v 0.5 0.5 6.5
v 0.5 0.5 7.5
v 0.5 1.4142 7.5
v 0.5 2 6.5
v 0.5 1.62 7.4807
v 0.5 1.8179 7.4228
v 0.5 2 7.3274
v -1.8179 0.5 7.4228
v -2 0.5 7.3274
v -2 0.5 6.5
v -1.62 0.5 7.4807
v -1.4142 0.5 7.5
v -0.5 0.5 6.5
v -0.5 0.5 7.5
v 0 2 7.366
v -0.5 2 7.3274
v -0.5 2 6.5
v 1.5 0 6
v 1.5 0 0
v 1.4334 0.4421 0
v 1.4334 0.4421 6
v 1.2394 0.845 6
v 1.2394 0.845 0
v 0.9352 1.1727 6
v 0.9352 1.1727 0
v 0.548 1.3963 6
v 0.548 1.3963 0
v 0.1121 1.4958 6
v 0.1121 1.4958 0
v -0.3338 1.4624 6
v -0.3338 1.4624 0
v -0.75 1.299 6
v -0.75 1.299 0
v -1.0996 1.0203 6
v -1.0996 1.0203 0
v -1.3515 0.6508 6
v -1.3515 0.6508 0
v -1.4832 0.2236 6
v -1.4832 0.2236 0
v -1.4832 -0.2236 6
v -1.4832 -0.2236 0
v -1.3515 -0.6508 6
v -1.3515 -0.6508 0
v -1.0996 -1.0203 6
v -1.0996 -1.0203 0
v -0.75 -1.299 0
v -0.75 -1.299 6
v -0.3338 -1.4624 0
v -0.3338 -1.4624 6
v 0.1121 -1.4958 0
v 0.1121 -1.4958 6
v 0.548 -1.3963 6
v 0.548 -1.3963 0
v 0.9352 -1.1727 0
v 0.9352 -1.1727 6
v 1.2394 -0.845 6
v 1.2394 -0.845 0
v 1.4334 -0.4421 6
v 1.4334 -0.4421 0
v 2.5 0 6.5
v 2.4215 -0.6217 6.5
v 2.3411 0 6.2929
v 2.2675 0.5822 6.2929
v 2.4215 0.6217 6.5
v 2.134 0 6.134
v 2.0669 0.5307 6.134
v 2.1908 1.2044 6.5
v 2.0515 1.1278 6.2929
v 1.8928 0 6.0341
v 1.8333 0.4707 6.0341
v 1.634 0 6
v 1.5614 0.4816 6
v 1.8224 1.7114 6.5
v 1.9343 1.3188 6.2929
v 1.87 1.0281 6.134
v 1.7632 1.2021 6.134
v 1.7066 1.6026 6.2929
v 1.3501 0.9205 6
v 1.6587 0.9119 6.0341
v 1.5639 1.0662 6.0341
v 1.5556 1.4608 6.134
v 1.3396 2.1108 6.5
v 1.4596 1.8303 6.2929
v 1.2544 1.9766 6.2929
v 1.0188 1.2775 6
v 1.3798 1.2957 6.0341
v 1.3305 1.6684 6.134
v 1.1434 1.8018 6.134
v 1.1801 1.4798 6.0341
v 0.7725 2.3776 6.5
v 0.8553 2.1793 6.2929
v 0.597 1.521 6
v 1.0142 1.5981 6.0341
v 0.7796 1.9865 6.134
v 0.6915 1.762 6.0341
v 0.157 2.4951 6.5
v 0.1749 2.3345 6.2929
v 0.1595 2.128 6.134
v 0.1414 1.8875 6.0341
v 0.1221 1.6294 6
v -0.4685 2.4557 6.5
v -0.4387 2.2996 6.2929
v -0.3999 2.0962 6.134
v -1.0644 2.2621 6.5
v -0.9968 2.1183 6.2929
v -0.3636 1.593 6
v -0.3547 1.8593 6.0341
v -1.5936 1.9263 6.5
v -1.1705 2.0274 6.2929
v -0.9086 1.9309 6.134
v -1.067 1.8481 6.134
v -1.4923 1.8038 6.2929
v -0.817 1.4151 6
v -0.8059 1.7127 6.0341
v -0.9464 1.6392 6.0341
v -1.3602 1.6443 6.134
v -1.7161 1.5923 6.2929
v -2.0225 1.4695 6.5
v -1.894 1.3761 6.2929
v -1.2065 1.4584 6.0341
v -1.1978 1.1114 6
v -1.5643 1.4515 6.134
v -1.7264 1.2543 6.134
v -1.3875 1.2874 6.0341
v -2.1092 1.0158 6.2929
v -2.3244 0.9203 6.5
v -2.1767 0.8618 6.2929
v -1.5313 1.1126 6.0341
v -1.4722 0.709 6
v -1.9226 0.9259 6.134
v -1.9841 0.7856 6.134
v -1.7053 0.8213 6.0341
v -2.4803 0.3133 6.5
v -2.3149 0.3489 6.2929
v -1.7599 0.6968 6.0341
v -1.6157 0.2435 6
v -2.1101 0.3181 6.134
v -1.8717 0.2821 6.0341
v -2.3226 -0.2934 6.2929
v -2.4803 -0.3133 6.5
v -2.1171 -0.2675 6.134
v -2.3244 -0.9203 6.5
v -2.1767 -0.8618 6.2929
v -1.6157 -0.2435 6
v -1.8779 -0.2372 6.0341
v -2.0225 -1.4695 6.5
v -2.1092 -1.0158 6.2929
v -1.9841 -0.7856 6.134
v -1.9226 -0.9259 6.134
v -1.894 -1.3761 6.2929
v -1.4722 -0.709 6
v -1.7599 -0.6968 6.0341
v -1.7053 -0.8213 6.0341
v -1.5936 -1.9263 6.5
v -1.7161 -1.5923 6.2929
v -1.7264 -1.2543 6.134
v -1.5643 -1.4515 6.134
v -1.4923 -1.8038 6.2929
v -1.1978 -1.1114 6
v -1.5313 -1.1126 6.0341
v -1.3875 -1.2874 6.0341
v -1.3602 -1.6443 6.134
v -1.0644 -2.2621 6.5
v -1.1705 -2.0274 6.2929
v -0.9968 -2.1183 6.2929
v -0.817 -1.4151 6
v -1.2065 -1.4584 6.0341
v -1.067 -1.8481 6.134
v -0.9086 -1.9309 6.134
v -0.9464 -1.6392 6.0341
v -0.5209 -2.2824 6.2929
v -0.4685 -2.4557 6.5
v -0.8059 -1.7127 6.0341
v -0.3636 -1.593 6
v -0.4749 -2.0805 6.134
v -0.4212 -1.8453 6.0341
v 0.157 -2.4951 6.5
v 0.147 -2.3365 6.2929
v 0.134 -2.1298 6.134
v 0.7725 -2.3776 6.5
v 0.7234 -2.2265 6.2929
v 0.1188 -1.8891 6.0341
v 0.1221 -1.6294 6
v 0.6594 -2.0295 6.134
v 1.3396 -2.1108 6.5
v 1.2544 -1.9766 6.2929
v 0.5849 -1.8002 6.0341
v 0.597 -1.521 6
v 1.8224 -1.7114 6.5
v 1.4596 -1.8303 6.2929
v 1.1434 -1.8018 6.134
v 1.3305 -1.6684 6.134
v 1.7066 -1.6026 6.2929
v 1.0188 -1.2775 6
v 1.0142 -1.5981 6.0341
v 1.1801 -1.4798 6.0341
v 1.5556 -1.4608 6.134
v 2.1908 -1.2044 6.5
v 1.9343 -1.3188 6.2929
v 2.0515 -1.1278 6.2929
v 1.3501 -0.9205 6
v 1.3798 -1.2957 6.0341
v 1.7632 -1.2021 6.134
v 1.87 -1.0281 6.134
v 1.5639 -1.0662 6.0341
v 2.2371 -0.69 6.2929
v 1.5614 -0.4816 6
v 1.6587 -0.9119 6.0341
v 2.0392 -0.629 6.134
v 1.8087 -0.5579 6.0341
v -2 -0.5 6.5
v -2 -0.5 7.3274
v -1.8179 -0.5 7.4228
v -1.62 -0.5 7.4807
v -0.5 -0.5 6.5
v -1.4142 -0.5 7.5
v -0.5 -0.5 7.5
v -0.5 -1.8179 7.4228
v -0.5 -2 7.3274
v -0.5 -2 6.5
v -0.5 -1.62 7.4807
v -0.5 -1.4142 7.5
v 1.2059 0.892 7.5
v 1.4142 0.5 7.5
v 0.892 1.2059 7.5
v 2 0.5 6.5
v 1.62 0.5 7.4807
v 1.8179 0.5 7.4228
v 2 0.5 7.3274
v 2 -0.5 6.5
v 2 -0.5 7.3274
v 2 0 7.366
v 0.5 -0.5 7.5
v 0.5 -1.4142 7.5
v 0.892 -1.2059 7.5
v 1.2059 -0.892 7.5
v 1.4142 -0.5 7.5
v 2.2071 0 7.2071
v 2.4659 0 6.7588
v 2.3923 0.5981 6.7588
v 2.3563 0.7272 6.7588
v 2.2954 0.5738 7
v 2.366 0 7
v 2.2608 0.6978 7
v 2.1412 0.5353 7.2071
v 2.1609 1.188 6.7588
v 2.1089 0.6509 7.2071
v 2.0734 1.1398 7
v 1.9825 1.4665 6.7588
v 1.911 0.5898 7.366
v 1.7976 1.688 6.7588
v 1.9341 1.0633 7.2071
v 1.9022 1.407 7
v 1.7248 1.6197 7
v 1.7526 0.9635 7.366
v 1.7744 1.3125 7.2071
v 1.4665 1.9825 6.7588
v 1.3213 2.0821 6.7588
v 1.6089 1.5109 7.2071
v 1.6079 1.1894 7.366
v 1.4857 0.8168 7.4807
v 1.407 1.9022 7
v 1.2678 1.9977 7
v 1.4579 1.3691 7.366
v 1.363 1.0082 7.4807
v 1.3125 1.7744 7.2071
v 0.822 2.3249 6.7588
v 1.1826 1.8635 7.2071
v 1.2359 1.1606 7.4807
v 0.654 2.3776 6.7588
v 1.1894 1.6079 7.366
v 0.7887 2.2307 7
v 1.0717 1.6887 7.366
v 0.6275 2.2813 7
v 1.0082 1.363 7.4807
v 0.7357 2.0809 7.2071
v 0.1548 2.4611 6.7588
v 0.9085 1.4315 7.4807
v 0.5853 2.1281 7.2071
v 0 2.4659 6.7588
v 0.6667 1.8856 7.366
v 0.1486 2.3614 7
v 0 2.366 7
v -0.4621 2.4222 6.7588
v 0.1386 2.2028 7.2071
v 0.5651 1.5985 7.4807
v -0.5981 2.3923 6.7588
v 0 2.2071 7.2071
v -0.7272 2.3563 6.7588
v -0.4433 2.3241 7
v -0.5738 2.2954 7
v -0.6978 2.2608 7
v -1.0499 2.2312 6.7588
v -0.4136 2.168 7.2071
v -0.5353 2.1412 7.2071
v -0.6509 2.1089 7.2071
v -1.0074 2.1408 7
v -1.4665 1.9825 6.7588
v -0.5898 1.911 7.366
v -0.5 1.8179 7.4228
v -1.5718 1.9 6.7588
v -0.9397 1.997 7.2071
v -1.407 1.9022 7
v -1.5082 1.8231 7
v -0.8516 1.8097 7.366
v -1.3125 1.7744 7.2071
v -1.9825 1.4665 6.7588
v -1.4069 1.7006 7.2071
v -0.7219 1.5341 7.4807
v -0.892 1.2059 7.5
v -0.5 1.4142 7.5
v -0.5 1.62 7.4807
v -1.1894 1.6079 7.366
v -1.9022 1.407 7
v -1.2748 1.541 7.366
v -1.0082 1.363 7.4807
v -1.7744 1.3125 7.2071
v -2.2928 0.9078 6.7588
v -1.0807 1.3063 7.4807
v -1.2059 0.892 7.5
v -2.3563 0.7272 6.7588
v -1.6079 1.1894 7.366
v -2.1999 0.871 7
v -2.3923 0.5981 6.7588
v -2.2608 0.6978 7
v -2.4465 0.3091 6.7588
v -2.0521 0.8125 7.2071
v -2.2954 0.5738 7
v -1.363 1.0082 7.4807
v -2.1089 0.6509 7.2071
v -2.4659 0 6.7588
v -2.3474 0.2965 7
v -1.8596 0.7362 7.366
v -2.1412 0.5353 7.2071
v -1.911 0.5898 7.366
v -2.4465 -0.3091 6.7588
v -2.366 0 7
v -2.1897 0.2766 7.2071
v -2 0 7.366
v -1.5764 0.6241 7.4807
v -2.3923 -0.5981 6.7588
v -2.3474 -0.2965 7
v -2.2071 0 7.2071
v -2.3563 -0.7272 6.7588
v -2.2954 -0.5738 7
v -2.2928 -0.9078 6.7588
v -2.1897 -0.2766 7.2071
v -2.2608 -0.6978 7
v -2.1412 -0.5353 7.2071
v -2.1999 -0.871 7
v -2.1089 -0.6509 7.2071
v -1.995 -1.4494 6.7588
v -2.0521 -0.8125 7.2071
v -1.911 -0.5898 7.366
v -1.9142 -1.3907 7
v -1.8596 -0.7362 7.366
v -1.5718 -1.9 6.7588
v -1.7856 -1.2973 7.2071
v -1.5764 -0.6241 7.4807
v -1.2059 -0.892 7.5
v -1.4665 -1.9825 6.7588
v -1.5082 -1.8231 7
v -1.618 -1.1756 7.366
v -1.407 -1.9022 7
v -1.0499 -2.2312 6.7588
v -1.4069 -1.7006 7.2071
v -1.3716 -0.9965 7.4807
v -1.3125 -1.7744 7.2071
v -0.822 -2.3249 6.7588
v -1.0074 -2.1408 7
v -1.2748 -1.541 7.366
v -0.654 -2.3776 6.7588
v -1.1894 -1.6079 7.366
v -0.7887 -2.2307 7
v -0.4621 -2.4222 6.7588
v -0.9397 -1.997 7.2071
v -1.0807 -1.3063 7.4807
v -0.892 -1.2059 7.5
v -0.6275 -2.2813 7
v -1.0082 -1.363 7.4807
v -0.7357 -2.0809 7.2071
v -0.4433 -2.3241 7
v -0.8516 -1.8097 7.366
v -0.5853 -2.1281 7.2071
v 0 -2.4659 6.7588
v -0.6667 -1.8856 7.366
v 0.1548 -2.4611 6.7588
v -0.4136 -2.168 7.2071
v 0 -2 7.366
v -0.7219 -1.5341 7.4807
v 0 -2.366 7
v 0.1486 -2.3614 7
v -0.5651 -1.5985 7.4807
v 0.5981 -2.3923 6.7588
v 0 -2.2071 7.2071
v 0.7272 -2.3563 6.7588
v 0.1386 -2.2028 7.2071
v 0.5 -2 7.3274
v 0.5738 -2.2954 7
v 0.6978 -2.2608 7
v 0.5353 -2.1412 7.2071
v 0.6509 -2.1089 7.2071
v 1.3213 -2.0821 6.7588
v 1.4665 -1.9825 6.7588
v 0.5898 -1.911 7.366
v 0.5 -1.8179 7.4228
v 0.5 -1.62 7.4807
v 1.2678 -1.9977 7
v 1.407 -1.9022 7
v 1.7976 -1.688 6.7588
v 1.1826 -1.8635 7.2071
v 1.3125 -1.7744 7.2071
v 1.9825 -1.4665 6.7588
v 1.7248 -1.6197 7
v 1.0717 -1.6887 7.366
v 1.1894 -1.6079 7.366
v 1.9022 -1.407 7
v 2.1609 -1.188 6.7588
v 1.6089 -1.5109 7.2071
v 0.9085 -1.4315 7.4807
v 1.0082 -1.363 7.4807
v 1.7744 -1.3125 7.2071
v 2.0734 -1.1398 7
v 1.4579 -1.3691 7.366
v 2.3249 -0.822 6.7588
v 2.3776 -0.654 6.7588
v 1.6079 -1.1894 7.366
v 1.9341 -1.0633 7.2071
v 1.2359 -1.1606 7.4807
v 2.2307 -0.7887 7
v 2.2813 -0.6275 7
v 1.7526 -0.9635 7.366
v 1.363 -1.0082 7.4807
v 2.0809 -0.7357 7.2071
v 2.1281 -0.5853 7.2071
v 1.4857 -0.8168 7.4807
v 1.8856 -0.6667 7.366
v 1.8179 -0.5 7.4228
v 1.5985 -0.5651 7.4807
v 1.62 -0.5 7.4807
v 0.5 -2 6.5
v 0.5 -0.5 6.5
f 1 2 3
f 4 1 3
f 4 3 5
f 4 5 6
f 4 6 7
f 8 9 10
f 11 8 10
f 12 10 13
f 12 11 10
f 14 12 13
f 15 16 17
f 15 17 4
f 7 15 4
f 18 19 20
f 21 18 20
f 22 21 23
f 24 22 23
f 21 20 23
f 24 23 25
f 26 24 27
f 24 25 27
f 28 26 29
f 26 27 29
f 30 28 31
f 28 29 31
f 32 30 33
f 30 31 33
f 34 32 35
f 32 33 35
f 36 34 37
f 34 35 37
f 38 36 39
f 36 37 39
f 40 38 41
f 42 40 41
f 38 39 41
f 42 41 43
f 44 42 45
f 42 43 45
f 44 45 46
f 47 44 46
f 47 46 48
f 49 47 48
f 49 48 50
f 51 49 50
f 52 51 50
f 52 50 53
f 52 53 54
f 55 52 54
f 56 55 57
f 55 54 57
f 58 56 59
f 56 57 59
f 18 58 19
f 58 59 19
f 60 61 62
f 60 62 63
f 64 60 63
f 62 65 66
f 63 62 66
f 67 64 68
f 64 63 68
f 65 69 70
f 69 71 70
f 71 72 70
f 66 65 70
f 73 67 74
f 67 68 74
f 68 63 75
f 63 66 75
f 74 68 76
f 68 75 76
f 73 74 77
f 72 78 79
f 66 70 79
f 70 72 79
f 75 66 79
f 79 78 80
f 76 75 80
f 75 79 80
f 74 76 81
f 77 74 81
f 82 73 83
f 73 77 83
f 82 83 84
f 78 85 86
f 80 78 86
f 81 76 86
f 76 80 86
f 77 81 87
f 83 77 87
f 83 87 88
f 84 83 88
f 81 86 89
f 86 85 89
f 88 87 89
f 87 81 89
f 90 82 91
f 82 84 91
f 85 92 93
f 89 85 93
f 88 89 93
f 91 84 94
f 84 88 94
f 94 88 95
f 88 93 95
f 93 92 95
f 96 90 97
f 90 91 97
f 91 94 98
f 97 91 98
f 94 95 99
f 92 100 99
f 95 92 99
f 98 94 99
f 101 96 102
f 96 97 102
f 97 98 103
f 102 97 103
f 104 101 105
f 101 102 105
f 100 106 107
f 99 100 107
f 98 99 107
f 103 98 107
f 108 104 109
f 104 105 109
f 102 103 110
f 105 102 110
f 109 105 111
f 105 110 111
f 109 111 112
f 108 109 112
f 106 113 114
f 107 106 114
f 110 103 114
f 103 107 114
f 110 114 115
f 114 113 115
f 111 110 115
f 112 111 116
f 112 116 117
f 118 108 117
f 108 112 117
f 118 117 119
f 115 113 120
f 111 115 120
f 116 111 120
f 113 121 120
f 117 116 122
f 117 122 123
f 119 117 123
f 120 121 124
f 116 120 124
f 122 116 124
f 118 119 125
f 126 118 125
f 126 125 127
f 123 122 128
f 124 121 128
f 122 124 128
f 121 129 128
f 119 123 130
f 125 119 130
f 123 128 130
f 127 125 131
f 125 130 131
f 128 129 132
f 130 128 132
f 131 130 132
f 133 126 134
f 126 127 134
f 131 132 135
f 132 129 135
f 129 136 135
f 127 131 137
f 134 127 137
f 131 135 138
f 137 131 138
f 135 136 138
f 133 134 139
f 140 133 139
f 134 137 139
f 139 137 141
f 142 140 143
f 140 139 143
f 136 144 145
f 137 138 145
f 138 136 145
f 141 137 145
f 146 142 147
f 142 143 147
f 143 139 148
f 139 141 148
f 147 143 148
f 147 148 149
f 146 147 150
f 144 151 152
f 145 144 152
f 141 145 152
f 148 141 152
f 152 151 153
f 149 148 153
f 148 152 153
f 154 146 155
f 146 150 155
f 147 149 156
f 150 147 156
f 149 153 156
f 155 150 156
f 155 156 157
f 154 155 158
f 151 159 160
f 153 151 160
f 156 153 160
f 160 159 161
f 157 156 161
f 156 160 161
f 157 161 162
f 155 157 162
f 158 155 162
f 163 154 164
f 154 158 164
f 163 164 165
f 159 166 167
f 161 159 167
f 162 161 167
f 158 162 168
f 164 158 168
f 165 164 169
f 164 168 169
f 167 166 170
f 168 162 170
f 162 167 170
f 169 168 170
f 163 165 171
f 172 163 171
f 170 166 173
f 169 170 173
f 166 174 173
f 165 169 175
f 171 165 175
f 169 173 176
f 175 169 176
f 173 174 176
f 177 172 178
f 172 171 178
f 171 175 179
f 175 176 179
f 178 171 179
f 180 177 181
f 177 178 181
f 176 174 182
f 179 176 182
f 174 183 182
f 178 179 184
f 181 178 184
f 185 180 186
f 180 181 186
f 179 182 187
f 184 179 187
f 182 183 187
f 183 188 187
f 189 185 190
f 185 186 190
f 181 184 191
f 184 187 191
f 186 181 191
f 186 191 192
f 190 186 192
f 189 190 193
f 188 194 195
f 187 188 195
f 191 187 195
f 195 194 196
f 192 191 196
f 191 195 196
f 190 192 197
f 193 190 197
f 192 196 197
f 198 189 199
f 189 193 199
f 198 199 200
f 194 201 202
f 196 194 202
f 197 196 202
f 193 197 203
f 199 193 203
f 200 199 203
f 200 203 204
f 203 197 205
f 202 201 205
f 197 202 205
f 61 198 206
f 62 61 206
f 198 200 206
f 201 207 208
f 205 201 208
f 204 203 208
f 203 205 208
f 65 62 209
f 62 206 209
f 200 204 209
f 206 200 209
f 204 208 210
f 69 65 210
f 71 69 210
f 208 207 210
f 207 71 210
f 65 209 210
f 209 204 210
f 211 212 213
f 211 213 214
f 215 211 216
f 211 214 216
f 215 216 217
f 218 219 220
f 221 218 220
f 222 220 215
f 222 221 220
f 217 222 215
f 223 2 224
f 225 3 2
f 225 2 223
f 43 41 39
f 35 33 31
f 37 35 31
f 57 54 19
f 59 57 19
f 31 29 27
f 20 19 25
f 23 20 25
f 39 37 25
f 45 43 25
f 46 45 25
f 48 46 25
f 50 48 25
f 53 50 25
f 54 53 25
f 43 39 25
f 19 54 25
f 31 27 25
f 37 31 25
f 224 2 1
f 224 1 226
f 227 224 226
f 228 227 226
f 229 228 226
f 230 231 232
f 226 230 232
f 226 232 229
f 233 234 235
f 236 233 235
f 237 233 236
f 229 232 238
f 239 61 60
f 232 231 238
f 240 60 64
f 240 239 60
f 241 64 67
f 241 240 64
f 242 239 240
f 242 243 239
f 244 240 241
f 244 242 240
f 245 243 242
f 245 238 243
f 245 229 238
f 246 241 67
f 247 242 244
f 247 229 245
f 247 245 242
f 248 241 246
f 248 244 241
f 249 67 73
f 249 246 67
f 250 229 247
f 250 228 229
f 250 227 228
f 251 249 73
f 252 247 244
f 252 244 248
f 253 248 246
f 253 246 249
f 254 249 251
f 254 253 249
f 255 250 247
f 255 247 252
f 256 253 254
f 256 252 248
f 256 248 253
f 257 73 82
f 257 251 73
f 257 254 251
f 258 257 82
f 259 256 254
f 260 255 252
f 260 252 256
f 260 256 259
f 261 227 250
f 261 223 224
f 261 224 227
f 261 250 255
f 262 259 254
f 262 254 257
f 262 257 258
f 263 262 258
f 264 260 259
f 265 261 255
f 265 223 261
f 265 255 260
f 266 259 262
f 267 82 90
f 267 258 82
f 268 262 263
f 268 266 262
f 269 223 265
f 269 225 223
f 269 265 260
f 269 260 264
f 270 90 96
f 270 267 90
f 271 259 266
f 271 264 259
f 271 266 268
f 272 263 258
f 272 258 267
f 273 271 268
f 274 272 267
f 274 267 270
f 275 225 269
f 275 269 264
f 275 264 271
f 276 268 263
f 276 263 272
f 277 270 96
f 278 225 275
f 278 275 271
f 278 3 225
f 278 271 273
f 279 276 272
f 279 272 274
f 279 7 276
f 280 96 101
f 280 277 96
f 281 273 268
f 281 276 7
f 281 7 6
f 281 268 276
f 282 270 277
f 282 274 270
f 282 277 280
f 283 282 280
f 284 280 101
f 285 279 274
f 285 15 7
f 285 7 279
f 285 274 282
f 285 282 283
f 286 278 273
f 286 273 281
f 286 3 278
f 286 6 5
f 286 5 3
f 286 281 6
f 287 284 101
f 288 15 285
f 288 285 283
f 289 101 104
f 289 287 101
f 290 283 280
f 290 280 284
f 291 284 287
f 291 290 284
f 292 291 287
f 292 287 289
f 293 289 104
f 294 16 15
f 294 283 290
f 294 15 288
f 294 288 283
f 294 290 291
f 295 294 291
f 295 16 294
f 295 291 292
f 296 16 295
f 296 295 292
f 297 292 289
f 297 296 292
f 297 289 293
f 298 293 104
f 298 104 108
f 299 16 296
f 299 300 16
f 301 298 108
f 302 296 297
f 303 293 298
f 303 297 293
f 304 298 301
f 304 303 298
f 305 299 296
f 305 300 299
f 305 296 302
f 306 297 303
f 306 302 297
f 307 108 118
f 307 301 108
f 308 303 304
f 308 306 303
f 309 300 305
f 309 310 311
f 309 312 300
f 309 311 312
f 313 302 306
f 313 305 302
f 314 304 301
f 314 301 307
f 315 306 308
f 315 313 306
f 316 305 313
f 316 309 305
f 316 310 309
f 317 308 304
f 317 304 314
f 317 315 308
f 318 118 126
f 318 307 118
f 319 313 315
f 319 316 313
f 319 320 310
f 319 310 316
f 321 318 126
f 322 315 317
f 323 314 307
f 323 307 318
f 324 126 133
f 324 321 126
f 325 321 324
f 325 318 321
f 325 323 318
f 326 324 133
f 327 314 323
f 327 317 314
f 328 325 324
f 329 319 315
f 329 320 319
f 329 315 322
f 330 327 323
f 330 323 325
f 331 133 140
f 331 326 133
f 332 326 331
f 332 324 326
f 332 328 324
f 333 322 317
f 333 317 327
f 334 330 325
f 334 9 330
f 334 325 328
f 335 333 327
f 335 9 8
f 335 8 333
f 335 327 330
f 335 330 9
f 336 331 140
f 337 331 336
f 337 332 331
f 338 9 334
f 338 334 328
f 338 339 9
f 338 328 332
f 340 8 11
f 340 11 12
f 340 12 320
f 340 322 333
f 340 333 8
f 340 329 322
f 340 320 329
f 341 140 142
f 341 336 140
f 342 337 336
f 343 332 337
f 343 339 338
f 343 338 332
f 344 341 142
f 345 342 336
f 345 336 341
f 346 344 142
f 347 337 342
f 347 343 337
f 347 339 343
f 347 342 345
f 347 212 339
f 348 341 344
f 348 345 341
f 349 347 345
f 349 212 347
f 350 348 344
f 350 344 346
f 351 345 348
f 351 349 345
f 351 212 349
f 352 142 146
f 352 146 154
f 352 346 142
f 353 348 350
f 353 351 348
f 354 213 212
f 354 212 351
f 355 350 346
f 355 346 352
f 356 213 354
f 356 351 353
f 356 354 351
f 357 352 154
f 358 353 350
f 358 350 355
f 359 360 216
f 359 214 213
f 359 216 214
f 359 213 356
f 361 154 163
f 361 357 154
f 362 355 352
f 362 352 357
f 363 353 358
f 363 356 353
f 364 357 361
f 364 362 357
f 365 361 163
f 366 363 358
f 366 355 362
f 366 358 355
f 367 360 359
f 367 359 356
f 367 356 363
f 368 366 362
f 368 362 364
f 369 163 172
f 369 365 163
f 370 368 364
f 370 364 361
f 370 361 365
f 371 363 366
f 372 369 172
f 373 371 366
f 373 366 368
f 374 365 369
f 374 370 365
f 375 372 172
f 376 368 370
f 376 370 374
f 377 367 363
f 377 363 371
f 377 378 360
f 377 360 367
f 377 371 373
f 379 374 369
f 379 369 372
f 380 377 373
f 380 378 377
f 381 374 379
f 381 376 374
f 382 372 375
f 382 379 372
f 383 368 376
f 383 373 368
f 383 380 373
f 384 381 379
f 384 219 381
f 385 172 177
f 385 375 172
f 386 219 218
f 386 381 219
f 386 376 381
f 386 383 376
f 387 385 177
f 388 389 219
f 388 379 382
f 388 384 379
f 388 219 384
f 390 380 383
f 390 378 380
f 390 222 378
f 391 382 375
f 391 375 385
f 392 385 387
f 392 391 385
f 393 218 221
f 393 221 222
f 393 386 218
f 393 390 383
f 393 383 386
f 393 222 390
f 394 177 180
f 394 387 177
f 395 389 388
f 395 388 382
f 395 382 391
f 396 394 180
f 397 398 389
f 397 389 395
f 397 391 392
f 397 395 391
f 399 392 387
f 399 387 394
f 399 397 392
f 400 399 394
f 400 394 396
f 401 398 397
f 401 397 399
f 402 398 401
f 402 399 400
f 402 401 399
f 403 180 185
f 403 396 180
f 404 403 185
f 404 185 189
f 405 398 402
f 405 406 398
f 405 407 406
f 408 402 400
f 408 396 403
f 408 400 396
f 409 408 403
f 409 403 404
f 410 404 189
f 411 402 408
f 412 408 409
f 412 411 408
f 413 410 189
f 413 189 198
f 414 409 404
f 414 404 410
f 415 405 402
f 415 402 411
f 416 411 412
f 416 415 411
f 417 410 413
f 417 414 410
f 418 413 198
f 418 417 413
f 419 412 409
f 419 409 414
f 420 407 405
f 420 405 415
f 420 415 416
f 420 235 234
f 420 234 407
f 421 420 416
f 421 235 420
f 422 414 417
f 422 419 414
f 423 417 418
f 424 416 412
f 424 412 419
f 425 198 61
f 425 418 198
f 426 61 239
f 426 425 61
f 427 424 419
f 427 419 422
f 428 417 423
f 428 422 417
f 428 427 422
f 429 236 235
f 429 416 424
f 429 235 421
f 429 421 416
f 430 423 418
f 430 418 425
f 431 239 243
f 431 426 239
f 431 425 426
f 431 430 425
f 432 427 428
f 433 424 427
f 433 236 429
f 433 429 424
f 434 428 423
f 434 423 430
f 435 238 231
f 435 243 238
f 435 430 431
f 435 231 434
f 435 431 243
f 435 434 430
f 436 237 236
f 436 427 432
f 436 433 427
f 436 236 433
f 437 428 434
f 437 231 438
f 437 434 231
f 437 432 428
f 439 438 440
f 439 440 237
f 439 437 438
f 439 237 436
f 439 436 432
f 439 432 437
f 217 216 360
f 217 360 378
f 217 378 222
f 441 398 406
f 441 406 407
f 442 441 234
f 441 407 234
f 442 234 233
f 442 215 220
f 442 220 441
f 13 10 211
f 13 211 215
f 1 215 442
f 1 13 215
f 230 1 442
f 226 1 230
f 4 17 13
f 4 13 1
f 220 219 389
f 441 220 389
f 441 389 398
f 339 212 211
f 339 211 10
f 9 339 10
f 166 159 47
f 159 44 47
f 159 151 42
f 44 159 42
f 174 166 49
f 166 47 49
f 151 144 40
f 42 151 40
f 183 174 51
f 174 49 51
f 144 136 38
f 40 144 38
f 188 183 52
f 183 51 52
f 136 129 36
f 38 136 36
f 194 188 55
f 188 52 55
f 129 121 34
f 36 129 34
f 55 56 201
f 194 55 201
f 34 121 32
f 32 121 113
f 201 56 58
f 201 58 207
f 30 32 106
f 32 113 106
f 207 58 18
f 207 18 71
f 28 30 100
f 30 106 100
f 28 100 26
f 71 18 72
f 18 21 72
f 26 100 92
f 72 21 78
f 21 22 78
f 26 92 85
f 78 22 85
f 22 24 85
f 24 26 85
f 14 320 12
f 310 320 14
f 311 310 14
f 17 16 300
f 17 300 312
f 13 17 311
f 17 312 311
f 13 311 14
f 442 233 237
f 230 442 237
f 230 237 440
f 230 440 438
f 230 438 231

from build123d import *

# Parameters (mm, degrees)
F0_R     = 1.5
F1_DEPTH = 6
F2_R     = 2.5
F3_DEPTH = 1.5
F4_W     = 1
F4_H     = 1.5
F4_H_2   = 1
F4_W_2   = 1.5
F5_DEPTH = 1


# Not quite as in the source:
# - a fillet or chamfer that OpenCascade refuses, or shapes differently, is made with other operations: its cross-section is extruded or revolved along the edge and cut away or added


with BuildPart() as f1:
    # F0 (on Top) → F1 (new body)
    with BuildSketch(Plane.XY):
        Circle(F0_R)
    extrude(amount=F1_DEPTH)

    # F2 (on face) → F3 (join)
    with BuildSketch(Plane.XY.offset(6)):
        Circle(F2_R)
    extrude(amount=F3_DEPTH)

    # F4 (on face) → F5 (cut)
    with BuildSketch(Plane.XY.offset(7.5)):
        with Locations((0, 1.25)):
            Rectangle(F4_W, F4_H)
        Rectangle(F4_W, F4_H_2)
        with Locations((-1.25, 0)):
            Rectangle(F4_W_2, F4_H_2)
        with Locations((1.25, 0)):
            Rectangle(F4_W_2, F4_H_2)
        with Locations((0, -1.25)):
            Rectangle(F4_W, F4_H)
    extrude(amount=-F5_DEPTH, mode=Mode.SUBTRACT)

    # F6: fillet of radius 1 on 1 edges, made by hand

    # F6_s1 → F6_t2 (revolve, cut)
    with BuildSketch(Plane.XZ):
        with BuildLine():
            ThreePointArc((2.5, 6.5), (2.2071067812, 7.2071067812), (1.5, 7.5))
            Line((1.5, 7.5), (2.5, 7.5))
            Line((2.5, 7.5), (2.5, 6.5))
        make_face()
    revolve(axis=Axis((0, 0, 7.5), (0, 0, 1)), mode=Mode.SUBTRACT)

    # F7: fillet of radius 1 on 1 edges, made by hand

    # F7_s1 → F7_t2 (revolve, cut)
    with BuildSketch(Plane.XZ):
        with BuildLine():
            ThreePointArc((2.5, 6.5), (2.1339745962, 6.1339745962), (1.6339745962, 6))
            Line((1.6339745962, 6), (2.5, 6))
            Line((2.5, 6), (2.5, 6.5))
        make_face()
    revolve(axis=Axis((0, 0, 6), (0, 0, 1)), mode=Mode.SUBTRACT)


solid = f1.part
